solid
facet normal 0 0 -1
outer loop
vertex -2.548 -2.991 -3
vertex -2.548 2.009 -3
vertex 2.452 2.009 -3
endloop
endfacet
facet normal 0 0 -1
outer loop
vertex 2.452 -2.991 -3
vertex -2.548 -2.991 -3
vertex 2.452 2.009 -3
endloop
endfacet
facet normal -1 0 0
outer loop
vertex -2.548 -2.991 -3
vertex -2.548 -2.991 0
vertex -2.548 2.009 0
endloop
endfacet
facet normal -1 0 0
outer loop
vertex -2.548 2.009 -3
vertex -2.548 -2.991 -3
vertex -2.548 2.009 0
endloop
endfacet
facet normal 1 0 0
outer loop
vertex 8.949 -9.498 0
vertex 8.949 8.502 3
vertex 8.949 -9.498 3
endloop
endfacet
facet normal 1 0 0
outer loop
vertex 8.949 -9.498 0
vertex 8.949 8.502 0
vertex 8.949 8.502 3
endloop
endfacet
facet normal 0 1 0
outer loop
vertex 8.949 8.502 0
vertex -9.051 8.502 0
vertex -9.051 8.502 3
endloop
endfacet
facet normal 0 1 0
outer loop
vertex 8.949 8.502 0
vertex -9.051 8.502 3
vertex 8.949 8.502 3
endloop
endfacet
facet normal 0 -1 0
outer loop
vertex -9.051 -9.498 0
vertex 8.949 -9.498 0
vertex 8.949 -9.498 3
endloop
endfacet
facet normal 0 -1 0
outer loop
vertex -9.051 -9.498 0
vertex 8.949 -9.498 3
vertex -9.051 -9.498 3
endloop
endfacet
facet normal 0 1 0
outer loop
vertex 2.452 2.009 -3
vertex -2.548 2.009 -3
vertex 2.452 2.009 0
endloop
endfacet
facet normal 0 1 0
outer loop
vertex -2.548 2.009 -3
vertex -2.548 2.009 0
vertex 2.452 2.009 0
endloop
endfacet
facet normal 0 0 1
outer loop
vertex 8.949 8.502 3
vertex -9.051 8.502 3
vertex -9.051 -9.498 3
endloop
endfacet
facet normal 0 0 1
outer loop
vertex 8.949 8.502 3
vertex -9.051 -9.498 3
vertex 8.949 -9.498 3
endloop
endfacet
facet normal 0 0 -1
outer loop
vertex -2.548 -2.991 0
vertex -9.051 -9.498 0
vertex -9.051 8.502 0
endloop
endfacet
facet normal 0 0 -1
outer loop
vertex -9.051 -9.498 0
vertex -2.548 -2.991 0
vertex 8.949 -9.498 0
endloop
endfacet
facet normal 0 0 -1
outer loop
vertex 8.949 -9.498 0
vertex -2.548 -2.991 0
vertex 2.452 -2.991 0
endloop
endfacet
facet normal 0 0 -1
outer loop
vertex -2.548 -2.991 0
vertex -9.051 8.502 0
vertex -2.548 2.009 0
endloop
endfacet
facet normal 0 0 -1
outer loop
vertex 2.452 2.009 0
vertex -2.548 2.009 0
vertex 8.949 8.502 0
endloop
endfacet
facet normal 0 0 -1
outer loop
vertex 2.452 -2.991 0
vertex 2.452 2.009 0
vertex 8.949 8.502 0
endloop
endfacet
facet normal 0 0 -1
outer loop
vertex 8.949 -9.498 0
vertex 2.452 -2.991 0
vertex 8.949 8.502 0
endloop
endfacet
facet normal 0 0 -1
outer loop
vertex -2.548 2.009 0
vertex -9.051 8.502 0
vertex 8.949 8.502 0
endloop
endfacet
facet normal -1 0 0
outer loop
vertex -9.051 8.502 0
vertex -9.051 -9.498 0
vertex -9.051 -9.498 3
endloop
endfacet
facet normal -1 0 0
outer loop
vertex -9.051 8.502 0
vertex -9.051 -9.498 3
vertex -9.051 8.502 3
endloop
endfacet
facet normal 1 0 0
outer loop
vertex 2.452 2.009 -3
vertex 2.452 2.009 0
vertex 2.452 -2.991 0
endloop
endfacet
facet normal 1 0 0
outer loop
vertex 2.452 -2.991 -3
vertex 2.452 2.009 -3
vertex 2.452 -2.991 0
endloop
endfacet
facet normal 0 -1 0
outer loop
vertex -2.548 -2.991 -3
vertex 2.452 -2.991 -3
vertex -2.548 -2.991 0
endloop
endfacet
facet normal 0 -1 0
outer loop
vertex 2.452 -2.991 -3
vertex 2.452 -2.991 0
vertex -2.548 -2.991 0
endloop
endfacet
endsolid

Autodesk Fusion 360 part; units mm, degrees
sketch "草图1" plane through (0, 0, 0) normal (0, 0, 1) x (1, 0, 0)
  line L0 (-9.0514, 8.5015) -> (8.9486, 8.5015)
  line L1 (8.9486, 8.5015) -> (8.9486, -9.4985)
  line L2 (8.9486, -9.4985) -> (-9.0514, -9.4985)
  line L3 (-9.0514, -9.4985) -> (-9.0514, 8.5015)
  dimension "d3" = 18
  dimension "d4" = 18
extrude "拉伸1" add sketch "草图1" along normal blind 3
sketch "草图2" plane through (0, 0, 0) normal (0, 0, 1) x (1, 0, 0)
  line L0 (-2.5482, 2.0089) -> (2.4518, 2.0089)
  line L1 (2.4518, 2.0089) -> (2.4518, -2.9911)
  line L2 (2.4518, -2.9911) -> (-2.5482, -2.9911)
  line L3 (-2.5482, -2.9911) -> (-2.5482, 2.0089)
  dimension "d7" = 5
  dimension "d8" = 5
extrude "拉伸2" add sketch "草图2" against normal blind 3
